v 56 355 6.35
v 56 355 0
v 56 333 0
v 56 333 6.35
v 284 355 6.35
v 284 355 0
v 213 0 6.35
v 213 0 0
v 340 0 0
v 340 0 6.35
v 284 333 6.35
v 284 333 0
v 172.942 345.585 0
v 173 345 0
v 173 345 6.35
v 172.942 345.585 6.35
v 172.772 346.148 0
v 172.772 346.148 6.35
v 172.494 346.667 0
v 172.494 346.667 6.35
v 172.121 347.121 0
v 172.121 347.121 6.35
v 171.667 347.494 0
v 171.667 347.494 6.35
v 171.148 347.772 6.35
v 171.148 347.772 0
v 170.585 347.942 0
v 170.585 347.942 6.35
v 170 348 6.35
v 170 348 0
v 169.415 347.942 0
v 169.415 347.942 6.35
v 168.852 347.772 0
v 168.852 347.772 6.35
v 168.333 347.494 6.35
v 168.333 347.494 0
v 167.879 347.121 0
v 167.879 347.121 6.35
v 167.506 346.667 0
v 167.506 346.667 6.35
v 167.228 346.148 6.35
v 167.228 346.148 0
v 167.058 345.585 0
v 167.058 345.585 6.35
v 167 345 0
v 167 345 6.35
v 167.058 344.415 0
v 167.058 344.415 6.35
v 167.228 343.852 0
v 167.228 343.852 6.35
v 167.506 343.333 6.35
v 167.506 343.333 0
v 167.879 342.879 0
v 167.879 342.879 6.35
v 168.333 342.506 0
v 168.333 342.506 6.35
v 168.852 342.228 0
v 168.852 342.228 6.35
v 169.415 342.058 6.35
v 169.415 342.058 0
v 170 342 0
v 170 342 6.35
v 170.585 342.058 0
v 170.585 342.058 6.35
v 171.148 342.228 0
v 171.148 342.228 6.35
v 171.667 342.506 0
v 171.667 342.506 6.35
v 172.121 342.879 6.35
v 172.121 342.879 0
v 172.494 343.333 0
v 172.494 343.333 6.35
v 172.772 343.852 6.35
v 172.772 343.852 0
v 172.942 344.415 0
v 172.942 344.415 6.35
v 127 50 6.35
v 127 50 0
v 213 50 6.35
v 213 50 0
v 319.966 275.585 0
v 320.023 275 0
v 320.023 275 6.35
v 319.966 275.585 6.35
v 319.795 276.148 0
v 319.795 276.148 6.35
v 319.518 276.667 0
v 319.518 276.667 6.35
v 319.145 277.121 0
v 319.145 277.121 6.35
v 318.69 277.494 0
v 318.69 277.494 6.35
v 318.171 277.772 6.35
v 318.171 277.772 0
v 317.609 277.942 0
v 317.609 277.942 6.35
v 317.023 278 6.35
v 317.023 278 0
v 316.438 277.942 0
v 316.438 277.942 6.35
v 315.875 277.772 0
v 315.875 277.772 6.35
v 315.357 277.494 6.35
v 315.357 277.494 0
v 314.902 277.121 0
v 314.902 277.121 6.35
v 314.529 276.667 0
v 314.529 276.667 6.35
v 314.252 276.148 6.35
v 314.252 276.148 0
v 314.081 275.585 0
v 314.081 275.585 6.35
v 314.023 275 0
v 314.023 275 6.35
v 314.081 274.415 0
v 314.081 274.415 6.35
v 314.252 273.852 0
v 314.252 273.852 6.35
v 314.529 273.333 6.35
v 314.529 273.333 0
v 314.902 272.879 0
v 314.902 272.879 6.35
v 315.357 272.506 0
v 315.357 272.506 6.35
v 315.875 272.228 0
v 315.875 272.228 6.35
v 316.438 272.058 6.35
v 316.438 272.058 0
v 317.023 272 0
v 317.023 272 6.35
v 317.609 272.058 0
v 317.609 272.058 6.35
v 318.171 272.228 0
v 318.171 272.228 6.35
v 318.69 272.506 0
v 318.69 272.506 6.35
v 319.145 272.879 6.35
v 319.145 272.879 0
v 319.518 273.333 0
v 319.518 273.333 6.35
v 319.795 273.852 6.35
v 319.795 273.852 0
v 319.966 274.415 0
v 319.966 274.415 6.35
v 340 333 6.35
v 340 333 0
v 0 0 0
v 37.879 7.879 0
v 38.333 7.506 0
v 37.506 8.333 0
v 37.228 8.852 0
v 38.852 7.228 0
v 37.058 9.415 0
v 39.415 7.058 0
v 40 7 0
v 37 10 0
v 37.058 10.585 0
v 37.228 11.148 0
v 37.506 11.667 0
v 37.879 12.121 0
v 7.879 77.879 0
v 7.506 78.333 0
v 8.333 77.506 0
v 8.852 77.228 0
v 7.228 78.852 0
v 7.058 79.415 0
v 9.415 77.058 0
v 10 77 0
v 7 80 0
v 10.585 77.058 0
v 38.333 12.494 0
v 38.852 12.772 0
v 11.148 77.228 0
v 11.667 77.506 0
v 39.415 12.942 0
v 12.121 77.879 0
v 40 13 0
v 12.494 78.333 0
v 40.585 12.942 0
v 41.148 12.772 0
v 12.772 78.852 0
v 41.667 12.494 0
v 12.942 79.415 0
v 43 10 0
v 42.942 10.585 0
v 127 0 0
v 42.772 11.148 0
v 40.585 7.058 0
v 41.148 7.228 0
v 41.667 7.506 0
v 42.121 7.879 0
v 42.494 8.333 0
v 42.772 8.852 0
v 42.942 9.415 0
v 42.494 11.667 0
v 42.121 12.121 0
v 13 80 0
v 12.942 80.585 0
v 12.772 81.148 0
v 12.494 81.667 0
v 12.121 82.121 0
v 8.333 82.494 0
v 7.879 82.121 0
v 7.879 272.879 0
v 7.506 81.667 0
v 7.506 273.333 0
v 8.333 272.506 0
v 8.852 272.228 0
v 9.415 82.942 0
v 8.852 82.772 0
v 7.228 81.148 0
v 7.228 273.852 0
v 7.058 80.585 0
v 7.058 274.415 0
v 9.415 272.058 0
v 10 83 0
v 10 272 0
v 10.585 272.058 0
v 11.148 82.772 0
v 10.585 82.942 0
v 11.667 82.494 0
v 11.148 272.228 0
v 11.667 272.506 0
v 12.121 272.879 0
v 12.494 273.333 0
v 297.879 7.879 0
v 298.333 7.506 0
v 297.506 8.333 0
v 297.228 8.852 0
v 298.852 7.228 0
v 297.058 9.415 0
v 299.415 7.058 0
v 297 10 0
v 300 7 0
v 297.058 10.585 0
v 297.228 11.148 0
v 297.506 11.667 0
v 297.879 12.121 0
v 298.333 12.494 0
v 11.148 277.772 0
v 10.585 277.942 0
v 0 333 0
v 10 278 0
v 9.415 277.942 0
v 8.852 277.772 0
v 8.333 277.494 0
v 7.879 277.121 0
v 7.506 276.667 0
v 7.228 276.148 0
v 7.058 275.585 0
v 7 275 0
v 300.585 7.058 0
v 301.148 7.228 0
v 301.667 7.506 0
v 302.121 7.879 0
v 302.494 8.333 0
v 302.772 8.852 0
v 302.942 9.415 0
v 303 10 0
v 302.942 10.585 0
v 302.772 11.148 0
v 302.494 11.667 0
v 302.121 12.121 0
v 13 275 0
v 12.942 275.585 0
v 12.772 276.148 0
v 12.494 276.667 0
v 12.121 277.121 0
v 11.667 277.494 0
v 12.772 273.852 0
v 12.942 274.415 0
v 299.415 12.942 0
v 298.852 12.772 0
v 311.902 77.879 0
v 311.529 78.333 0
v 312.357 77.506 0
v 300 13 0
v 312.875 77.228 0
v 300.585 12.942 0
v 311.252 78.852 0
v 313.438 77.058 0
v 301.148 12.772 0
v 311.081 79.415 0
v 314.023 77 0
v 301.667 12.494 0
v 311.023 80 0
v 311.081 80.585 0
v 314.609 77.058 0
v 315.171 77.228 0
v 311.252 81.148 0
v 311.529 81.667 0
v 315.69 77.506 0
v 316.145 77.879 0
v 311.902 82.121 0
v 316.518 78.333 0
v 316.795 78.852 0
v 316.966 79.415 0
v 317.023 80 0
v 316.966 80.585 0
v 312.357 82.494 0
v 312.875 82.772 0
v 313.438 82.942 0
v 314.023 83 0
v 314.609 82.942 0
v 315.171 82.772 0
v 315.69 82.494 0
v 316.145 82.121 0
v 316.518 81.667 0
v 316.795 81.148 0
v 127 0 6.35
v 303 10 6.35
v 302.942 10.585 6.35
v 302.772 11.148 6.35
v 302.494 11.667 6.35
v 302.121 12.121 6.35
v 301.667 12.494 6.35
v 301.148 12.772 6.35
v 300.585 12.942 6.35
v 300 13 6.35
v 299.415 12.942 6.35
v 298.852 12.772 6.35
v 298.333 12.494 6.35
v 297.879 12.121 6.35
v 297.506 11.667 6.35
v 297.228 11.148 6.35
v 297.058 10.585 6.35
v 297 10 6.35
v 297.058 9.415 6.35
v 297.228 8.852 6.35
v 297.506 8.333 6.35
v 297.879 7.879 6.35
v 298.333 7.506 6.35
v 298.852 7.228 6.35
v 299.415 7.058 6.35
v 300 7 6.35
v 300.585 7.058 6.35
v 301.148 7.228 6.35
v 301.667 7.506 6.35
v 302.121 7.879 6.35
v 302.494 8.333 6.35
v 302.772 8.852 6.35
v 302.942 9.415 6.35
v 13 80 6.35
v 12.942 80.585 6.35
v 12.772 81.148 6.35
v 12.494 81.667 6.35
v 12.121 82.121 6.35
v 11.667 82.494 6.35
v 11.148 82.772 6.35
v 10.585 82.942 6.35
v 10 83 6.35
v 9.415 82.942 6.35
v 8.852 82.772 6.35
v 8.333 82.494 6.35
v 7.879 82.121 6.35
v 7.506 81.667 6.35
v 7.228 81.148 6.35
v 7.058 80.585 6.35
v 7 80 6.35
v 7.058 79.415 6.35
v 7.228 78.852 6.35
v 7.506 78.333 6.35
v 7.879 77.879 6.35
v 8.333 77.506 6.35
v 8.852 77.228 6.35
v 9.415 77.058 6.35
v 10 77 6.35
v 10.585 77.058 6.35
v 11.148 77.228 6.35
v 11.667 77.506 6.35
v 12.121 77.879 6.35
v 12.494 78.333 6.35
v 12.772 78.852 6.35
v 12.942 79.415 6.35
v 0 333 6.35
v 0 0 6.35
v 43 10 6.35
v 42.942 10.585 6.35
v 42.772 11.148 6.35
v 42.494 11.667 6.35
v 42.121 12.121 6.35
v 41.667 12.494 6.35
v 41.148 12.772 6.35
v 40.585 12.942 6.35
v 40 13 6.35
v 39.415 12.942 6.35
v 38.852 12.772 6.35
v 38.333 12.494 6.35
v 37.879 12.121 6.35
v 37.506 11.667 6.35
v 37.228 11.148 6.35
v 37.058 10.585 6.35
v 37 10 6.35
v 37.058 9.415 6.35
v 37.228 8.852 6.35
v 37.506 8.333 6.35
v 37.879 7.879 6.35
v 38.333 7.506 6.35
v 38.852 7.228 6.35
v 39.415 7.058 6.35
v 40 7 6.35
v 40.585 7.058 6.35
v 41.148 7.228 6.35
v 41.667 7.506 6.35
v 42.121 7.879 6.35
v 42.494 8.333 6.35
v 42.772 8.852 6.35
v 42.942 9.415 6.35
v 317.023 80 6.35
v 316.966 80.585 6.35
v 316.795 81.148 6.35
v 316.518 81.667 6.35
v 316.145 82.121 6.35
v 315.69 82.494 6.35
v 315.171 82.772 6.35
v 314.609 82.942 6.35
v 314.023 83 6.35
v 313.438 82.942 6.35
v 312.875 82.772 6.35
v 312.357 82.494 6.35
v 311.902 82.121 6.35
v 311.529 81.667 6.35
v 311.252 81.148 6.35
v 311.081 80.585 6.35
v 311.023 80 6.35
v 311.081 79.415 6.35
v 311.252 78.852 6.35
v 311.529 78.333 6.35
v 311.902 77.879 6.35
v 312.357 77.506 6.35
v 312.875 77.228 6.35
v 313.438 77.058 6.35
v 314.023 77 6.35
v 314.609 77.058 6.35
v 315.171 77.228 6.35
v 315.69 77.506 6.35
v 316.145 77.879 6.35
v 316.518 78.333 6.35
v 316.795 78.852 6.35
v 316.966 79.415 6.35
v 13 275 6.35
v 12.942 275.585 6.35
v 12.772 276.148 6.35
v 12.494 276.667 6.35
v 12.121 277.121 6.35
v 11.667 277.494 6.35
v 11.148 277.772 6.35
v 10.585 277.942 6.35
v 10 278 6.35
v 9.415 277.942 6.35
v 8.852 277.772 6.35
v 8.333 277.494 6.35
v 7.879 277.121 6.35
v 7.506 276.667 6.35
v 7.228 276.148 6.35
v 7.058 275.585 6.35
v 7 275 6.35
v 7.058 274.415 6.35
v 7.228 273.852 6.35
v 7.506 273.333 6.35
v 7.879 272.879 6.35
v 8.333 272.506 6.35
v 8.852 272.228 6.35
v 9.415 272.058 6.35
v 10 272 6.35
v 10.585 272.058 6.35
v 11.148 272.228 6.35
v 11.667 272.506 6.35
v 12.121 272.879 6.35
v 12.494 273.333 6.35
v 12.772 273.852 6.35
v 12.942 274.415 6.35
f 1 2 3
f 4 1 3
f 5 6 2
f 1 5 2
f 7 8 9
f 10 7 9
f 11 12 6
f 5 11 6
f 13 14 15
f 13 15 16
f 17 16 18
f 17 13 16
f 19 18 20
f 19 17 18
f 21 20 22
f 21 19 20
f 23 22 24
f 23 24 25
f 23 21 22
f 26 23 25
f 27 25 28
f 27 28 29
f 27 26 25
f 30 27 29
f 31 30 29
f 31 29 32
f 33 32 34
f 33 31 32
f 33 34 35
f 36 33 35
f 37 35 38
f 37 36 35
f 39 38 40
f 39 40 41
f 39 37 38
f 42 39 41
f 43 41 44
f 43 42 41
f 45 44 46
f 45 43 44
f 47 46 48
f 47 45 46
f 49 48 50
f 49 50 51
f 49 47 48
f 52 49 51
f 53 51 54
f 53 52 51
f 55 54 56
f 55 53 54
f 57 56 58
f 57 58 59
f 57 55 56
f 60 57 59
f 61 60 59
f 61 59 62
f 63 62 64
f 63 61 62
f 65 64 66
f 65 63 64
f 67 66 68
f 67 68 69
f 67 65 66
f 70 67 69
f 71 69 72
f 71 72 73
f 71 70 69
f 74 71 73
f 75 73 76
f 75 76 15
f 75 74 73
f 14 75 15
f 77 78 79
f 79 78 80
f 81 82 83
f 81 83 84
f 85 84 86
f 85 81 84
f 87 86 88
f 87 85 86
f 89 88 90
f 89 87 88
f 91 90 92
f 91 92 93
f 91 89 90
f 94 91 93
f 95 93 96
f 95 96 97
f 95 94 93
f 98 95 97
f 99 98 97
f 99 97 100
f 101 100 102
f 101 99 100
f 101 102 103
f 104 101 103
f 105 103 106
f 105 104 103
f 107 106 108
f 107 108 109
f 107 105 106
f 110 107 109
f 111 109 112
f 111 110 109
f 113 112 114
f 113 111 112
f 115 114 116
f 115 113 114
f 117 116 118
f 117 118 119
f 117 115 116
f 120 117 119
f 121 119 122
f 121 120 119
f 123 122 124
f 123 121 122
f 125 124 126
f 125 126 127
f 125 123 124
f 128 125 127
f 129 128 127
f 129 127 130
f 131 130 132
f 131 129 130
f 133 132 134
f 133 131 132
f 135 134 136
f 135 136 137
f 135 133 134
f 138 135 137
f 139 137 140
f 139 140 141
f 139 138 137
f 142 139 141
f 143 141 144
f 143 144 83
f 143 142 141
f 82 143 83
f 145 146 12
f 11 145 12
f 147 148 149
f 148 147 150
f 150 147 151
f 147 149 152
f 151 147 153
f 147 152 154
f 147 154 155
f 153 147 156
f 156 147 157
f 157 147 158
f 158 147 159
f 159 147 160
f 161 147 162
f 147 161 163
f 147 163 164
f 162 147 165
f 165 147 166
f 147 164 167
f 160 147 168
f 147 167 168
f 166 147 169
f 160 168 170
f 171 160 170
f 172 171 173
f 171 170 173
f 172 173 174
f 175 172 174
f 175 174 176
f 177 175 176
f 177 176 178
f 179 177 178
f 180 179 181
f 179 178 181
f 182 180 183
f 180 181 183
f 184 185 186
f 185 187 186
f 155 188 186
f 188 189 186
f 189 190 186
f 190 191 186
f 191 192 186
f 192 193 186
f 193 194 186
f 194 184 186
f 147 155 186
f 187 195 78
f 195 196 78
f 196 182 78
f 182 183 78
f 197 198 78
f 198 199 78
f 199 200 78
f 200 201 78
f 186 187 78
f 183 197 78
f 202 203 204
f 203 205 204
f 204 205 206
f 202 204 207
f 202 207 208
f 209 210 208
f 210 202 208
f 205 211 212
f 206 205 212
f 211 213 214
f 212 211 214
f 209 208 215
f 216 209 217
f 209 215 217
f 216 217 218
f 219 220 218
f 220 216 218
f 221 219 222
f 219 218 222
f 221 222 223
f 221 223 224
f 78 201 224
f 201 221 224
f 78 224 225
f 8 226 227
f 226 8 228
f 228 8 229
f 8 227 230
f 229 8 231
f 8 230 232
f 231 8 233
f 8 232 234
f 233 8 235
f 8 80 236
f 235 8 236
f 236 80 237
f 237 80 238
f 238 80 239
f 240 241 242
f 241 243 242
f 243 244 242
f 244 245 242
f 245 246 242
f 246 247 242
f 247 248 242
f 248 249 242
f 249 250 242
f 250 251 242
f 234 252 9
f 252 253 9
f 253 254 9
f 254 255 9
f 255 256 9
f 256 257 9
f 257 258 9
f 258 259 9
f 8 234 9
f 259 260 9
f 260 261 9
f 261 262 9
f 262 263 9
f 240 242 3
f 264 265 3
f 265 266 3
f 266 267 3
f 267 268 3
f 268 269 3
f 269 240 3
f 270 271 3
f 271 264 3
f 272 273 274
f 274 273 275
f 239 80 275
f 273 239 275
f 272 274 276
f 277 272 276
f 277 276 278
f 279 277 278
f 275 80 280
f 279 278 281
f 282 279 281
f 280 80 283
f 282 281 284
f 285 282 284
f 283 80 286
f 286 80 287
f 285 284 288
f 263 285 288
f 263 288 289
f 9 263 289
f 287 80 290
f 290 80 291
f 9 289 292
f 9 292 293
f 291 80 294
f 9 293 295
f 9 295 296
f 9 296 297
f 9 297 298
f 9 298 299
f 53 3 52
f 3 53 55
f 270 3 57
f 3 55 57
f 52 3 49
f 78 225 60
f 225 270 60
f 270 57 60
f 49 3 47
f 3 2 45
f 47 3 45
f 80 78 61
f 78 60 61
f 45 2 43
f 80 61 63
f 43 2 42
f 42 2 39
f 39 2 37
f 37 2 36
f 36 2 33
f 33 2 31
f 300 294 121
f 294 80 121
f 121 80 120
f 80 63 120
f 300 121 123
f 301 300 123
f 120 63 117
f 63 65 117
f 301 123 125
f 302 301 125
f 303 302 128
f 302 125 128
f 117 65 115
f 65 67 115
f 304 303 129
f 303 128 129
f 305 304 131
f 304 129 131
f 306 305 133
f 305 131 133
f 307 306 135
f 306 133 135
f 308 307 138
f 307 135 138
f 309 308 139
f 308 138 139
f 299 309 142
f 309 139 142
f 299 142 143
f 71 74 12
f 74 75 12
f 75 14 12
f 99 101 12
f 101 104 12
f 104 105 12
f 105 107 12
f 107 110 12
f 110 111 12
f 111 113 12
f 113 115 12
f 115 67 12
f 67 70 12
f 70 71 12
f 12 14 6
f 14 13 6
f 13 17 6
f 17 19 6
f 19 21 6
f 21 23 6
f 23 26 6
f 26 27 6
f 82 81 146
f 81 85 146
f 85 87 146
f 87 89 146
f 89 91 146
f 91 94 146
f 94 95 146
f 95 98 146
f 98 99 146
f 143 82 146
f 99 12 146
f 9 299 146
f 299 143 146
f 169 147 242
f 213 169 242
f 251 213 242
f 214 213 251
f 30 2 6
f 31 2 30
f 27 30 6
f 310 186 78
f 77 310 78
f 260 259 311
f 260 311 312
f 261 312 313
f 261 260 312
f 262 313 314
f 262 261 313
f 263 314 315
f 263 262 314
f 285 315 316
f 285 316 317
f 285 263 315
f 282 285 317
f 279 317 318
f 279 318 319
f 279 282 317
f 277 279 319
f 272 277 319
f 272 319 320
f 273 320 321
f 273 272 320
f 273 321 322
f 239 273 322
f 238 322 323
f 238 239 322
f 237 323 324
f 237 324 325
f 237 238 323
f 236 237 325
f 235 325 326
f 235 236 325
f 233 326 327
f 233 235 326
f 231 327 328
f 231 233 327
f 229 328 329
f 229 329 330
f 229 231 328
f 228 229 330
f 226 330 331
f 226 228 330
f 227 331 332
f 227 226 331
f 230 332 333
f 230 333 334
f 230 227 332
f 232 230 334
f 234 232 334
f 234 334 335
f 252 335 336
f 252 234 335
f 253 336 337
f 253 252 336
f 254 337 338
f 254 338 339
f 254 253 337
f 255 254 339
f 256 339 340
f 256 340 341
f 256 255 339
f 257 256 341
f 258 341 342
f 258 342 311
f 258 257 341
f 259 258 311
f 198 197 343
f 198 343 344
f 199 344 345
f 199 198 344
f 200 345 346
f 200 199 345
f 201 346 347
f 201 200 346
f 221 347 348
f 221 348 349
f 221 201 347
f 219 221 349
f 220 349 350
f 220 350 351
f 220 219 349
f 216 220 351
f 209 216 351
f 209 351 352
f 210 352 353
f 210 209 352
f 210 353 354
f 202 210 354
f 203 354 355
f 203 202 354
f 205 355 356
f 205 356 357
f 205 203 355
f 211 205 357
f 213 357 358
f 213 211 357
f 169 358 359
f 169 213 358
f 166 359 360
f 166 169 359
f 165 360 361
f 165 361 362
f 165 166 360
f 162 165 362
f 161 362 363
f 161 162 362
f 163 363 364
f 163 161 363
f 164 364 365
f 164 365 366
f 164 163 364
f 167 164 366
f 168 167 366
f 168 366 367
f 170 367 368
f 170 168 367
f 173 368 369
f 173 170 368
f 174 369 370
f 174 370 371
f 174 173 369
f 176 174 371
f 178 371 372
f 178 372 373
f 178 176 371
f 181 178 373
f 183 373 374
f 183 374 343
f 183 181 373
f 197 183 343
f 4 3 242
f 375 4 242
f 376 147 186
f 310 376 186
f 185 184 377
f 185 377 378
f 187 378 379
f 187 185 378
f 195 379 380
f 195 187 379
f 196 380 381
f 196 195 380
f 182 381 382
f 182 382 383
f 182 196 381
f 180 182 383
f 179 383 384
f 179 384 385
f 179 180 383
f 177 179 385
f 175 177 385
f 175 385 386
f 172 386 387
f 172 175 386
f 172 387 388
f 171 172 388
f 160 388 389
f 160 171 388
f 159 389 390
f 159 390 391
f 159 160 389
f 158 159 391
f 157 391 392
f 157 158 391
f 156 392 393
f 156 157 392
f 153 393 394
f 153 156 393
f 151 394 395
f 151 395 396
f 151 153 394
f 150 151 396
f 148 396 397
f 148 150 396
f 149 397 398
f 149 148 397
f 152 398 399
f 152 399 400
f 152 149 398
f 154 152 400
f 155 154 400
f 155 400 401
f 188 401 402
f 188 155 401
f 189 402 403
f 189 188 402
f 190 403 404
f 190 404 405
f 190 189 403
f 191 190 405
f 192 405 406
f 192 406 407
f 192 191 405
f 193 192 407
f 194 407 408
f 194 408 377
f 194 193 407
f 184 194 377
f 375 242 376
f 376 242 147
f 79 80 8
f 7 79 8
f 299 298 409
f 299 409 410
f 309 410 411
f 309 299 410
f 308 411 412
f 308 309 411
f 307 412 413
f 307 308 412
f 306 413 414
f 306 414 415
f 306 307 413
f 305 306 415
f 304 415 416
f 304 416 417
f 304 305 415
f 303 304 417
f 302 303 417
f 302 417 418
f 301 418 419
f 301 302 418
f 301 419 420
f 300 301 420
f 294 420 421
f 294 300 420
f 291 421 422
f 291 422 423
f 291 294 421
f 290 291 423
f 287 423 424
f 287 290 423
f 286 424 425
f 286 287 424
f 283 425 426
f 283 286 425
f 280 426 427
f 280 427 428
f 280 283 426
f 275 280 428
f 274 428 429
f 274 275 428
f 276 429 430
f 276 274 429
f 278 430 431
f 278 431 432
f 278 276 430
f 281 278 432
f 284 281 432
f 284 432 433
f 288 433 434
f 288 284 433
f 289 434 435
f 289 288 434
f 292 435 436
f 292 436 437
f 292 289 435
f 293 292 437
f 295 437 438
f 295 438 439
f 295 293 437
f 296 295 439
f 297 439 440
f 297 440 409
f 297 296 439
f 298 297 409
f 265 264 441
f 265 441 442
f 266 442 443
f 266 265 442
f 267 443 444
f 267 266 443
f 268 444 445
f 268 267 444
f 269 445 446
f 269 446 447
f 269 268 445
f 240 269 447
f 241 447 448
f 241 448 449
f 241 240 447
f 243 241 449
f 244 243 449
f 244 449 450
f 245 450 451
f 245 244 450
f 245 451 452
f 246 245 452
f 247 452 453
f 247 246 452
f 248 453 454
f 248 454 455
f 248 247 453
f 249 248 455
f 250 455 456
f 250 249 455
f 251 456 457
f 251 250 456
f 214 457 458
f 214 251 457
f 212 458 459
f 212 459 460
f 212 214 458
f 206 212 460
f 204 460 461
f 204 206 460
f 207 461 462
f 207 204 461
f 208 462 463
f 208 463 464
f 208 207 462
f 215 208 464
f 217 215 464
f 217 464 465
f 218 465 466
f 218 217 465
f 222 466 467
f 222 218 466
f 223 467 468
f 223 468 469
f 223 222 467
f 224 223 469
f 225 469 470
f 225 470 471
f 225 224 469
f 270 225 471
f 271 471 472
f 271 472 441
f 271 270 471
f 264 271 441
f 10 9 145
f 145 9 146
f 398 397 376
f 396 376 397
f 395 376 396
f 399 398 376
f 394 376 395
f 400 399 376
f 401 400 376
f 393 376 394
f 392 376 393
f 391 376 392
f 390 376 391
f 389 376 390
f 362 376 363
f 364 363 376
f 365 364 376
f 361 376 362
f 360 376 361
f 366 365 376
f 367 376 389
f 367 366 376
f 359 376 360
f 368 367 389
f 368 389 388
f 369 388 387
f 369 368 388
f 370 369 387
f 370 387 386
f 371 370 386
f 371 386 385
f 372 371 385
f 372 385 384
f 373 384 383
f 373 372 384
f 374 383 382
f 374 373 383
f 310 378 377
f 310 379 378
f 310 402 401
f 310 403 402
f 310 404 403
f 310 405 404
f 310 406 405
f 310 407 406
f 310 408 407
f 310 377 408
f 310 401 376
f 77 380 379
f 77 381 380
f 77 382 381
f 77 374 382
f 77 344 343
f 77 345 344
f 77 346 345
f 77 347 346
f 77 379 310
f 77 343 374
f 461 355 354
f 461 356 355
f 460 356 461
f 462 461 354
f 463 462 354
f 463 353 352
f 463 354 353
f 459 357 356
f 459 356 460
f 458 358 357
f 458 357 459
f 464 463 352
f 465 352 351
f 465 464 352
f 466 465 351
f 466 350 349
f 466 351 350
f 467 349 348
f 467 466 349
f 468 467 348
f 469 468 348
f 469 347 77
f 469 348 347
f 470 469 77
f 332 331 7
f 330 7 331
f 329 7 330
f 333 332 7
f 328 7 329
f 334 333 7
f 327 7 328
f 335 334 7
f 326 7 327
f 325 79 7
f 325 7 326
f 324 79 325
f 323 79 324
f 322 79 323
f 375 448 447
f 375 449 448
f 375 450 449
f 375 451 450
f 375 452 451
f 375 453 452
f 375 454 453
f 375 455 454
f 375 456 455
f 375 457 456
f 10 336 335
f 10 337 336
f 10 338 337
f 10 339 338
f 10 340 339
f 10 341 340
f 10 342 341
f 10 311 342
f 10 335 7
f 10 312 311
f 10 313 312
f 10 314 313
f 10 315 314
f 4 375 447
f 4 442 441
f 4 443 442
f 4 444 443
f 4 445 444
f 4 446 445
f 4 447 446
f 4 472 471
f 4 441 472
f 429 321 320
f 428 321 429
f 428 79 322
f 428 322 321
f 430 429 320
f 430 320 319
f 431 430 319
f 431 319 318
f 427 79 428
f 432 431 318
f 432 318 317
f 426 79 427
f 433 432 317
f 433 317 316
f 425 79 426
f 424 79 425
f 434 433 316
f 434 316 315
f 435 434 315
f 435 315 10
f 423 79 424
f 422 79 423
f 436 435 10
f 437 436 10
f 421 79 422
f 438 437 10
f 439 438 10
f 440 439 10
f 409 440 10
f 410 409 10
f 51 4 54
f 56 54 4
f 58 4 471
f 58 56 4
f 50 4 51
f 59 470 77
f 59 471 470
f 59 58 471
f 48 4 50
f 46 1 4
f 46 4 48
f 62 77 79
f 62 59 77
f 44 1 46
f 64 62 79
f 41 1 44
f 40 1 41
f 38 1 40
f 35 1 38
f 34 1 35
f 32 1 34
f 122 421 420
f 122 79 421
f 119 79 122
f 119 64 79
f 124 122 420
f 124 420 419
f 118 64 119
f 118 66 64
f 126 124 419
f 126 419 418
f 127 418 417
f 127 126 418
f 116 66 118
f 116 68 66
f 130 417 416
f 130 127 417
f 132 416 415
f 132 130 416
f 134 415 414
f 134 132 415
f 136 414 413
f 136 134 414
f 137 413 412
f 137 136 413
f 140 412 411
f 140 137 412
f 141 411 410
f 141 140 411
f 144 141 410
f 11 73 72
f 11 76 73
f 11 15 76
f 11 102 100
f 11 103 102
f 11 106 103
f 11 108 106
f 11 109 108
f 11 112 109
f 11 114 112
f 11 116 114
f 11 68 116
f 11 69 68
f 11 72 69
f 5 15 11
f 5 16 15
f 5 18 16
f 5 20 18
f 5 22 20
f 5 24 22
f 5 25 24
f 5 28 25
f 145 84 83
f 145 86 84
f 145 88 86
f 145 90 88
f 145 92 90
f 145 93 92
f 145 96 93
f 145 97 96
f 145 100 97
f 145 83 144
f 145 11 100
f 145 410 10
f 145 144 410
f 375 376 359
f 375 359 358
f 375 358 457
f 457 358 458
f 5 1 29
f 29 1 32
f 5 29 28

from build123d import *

# Parameters (mm, degrees)
SKETCH1_R           = 3
BOSS_EXTRUDE1_DEPTH = 6.35


with BuildPart() as part:
    # Sketch1 → Boss-Extrude1 (new body)
    with BuildSketch(Plane.XY):
        Polygon((0, 333), (0, 0), (127, 0), (127, 50), (213, 50), (213, 0), (340, 0), (340, 333), (284, 333), (284, 355), (56, 355), (56, 333), align=None)
        with Locations((40, 10)):
            Circle(SKETCH1_R, mode=Mode.SUBTRACT)
        with Locations((10, 80)):
            Circle(SKETCH1_R, mode=Mode.SUBTRACT)
        with Locations((300, 10)):
            Circle(SKETCH1_R, mode=Mode.SUBTRACT)
        with Locations((314.023307373, 80)):
            Circle(SKETCH1_R, mode=Mode.SUBTRACT)
        with Locations((10, 275)):
            Circle(SKETCH1_R, mode=Mode.SUBTRACT)
        with Locations((170, 345)):
            Circle(SKETCH1_R, mode=Mode.SUBTRACT)
        with Locations((317.023307373, 275)):
            Circle(SKETCH1_R, mode=Mode.SUBTRACT)
    extrude(amount=BOSS_EXTRUDE1_DEPTH)


solid = part.part
